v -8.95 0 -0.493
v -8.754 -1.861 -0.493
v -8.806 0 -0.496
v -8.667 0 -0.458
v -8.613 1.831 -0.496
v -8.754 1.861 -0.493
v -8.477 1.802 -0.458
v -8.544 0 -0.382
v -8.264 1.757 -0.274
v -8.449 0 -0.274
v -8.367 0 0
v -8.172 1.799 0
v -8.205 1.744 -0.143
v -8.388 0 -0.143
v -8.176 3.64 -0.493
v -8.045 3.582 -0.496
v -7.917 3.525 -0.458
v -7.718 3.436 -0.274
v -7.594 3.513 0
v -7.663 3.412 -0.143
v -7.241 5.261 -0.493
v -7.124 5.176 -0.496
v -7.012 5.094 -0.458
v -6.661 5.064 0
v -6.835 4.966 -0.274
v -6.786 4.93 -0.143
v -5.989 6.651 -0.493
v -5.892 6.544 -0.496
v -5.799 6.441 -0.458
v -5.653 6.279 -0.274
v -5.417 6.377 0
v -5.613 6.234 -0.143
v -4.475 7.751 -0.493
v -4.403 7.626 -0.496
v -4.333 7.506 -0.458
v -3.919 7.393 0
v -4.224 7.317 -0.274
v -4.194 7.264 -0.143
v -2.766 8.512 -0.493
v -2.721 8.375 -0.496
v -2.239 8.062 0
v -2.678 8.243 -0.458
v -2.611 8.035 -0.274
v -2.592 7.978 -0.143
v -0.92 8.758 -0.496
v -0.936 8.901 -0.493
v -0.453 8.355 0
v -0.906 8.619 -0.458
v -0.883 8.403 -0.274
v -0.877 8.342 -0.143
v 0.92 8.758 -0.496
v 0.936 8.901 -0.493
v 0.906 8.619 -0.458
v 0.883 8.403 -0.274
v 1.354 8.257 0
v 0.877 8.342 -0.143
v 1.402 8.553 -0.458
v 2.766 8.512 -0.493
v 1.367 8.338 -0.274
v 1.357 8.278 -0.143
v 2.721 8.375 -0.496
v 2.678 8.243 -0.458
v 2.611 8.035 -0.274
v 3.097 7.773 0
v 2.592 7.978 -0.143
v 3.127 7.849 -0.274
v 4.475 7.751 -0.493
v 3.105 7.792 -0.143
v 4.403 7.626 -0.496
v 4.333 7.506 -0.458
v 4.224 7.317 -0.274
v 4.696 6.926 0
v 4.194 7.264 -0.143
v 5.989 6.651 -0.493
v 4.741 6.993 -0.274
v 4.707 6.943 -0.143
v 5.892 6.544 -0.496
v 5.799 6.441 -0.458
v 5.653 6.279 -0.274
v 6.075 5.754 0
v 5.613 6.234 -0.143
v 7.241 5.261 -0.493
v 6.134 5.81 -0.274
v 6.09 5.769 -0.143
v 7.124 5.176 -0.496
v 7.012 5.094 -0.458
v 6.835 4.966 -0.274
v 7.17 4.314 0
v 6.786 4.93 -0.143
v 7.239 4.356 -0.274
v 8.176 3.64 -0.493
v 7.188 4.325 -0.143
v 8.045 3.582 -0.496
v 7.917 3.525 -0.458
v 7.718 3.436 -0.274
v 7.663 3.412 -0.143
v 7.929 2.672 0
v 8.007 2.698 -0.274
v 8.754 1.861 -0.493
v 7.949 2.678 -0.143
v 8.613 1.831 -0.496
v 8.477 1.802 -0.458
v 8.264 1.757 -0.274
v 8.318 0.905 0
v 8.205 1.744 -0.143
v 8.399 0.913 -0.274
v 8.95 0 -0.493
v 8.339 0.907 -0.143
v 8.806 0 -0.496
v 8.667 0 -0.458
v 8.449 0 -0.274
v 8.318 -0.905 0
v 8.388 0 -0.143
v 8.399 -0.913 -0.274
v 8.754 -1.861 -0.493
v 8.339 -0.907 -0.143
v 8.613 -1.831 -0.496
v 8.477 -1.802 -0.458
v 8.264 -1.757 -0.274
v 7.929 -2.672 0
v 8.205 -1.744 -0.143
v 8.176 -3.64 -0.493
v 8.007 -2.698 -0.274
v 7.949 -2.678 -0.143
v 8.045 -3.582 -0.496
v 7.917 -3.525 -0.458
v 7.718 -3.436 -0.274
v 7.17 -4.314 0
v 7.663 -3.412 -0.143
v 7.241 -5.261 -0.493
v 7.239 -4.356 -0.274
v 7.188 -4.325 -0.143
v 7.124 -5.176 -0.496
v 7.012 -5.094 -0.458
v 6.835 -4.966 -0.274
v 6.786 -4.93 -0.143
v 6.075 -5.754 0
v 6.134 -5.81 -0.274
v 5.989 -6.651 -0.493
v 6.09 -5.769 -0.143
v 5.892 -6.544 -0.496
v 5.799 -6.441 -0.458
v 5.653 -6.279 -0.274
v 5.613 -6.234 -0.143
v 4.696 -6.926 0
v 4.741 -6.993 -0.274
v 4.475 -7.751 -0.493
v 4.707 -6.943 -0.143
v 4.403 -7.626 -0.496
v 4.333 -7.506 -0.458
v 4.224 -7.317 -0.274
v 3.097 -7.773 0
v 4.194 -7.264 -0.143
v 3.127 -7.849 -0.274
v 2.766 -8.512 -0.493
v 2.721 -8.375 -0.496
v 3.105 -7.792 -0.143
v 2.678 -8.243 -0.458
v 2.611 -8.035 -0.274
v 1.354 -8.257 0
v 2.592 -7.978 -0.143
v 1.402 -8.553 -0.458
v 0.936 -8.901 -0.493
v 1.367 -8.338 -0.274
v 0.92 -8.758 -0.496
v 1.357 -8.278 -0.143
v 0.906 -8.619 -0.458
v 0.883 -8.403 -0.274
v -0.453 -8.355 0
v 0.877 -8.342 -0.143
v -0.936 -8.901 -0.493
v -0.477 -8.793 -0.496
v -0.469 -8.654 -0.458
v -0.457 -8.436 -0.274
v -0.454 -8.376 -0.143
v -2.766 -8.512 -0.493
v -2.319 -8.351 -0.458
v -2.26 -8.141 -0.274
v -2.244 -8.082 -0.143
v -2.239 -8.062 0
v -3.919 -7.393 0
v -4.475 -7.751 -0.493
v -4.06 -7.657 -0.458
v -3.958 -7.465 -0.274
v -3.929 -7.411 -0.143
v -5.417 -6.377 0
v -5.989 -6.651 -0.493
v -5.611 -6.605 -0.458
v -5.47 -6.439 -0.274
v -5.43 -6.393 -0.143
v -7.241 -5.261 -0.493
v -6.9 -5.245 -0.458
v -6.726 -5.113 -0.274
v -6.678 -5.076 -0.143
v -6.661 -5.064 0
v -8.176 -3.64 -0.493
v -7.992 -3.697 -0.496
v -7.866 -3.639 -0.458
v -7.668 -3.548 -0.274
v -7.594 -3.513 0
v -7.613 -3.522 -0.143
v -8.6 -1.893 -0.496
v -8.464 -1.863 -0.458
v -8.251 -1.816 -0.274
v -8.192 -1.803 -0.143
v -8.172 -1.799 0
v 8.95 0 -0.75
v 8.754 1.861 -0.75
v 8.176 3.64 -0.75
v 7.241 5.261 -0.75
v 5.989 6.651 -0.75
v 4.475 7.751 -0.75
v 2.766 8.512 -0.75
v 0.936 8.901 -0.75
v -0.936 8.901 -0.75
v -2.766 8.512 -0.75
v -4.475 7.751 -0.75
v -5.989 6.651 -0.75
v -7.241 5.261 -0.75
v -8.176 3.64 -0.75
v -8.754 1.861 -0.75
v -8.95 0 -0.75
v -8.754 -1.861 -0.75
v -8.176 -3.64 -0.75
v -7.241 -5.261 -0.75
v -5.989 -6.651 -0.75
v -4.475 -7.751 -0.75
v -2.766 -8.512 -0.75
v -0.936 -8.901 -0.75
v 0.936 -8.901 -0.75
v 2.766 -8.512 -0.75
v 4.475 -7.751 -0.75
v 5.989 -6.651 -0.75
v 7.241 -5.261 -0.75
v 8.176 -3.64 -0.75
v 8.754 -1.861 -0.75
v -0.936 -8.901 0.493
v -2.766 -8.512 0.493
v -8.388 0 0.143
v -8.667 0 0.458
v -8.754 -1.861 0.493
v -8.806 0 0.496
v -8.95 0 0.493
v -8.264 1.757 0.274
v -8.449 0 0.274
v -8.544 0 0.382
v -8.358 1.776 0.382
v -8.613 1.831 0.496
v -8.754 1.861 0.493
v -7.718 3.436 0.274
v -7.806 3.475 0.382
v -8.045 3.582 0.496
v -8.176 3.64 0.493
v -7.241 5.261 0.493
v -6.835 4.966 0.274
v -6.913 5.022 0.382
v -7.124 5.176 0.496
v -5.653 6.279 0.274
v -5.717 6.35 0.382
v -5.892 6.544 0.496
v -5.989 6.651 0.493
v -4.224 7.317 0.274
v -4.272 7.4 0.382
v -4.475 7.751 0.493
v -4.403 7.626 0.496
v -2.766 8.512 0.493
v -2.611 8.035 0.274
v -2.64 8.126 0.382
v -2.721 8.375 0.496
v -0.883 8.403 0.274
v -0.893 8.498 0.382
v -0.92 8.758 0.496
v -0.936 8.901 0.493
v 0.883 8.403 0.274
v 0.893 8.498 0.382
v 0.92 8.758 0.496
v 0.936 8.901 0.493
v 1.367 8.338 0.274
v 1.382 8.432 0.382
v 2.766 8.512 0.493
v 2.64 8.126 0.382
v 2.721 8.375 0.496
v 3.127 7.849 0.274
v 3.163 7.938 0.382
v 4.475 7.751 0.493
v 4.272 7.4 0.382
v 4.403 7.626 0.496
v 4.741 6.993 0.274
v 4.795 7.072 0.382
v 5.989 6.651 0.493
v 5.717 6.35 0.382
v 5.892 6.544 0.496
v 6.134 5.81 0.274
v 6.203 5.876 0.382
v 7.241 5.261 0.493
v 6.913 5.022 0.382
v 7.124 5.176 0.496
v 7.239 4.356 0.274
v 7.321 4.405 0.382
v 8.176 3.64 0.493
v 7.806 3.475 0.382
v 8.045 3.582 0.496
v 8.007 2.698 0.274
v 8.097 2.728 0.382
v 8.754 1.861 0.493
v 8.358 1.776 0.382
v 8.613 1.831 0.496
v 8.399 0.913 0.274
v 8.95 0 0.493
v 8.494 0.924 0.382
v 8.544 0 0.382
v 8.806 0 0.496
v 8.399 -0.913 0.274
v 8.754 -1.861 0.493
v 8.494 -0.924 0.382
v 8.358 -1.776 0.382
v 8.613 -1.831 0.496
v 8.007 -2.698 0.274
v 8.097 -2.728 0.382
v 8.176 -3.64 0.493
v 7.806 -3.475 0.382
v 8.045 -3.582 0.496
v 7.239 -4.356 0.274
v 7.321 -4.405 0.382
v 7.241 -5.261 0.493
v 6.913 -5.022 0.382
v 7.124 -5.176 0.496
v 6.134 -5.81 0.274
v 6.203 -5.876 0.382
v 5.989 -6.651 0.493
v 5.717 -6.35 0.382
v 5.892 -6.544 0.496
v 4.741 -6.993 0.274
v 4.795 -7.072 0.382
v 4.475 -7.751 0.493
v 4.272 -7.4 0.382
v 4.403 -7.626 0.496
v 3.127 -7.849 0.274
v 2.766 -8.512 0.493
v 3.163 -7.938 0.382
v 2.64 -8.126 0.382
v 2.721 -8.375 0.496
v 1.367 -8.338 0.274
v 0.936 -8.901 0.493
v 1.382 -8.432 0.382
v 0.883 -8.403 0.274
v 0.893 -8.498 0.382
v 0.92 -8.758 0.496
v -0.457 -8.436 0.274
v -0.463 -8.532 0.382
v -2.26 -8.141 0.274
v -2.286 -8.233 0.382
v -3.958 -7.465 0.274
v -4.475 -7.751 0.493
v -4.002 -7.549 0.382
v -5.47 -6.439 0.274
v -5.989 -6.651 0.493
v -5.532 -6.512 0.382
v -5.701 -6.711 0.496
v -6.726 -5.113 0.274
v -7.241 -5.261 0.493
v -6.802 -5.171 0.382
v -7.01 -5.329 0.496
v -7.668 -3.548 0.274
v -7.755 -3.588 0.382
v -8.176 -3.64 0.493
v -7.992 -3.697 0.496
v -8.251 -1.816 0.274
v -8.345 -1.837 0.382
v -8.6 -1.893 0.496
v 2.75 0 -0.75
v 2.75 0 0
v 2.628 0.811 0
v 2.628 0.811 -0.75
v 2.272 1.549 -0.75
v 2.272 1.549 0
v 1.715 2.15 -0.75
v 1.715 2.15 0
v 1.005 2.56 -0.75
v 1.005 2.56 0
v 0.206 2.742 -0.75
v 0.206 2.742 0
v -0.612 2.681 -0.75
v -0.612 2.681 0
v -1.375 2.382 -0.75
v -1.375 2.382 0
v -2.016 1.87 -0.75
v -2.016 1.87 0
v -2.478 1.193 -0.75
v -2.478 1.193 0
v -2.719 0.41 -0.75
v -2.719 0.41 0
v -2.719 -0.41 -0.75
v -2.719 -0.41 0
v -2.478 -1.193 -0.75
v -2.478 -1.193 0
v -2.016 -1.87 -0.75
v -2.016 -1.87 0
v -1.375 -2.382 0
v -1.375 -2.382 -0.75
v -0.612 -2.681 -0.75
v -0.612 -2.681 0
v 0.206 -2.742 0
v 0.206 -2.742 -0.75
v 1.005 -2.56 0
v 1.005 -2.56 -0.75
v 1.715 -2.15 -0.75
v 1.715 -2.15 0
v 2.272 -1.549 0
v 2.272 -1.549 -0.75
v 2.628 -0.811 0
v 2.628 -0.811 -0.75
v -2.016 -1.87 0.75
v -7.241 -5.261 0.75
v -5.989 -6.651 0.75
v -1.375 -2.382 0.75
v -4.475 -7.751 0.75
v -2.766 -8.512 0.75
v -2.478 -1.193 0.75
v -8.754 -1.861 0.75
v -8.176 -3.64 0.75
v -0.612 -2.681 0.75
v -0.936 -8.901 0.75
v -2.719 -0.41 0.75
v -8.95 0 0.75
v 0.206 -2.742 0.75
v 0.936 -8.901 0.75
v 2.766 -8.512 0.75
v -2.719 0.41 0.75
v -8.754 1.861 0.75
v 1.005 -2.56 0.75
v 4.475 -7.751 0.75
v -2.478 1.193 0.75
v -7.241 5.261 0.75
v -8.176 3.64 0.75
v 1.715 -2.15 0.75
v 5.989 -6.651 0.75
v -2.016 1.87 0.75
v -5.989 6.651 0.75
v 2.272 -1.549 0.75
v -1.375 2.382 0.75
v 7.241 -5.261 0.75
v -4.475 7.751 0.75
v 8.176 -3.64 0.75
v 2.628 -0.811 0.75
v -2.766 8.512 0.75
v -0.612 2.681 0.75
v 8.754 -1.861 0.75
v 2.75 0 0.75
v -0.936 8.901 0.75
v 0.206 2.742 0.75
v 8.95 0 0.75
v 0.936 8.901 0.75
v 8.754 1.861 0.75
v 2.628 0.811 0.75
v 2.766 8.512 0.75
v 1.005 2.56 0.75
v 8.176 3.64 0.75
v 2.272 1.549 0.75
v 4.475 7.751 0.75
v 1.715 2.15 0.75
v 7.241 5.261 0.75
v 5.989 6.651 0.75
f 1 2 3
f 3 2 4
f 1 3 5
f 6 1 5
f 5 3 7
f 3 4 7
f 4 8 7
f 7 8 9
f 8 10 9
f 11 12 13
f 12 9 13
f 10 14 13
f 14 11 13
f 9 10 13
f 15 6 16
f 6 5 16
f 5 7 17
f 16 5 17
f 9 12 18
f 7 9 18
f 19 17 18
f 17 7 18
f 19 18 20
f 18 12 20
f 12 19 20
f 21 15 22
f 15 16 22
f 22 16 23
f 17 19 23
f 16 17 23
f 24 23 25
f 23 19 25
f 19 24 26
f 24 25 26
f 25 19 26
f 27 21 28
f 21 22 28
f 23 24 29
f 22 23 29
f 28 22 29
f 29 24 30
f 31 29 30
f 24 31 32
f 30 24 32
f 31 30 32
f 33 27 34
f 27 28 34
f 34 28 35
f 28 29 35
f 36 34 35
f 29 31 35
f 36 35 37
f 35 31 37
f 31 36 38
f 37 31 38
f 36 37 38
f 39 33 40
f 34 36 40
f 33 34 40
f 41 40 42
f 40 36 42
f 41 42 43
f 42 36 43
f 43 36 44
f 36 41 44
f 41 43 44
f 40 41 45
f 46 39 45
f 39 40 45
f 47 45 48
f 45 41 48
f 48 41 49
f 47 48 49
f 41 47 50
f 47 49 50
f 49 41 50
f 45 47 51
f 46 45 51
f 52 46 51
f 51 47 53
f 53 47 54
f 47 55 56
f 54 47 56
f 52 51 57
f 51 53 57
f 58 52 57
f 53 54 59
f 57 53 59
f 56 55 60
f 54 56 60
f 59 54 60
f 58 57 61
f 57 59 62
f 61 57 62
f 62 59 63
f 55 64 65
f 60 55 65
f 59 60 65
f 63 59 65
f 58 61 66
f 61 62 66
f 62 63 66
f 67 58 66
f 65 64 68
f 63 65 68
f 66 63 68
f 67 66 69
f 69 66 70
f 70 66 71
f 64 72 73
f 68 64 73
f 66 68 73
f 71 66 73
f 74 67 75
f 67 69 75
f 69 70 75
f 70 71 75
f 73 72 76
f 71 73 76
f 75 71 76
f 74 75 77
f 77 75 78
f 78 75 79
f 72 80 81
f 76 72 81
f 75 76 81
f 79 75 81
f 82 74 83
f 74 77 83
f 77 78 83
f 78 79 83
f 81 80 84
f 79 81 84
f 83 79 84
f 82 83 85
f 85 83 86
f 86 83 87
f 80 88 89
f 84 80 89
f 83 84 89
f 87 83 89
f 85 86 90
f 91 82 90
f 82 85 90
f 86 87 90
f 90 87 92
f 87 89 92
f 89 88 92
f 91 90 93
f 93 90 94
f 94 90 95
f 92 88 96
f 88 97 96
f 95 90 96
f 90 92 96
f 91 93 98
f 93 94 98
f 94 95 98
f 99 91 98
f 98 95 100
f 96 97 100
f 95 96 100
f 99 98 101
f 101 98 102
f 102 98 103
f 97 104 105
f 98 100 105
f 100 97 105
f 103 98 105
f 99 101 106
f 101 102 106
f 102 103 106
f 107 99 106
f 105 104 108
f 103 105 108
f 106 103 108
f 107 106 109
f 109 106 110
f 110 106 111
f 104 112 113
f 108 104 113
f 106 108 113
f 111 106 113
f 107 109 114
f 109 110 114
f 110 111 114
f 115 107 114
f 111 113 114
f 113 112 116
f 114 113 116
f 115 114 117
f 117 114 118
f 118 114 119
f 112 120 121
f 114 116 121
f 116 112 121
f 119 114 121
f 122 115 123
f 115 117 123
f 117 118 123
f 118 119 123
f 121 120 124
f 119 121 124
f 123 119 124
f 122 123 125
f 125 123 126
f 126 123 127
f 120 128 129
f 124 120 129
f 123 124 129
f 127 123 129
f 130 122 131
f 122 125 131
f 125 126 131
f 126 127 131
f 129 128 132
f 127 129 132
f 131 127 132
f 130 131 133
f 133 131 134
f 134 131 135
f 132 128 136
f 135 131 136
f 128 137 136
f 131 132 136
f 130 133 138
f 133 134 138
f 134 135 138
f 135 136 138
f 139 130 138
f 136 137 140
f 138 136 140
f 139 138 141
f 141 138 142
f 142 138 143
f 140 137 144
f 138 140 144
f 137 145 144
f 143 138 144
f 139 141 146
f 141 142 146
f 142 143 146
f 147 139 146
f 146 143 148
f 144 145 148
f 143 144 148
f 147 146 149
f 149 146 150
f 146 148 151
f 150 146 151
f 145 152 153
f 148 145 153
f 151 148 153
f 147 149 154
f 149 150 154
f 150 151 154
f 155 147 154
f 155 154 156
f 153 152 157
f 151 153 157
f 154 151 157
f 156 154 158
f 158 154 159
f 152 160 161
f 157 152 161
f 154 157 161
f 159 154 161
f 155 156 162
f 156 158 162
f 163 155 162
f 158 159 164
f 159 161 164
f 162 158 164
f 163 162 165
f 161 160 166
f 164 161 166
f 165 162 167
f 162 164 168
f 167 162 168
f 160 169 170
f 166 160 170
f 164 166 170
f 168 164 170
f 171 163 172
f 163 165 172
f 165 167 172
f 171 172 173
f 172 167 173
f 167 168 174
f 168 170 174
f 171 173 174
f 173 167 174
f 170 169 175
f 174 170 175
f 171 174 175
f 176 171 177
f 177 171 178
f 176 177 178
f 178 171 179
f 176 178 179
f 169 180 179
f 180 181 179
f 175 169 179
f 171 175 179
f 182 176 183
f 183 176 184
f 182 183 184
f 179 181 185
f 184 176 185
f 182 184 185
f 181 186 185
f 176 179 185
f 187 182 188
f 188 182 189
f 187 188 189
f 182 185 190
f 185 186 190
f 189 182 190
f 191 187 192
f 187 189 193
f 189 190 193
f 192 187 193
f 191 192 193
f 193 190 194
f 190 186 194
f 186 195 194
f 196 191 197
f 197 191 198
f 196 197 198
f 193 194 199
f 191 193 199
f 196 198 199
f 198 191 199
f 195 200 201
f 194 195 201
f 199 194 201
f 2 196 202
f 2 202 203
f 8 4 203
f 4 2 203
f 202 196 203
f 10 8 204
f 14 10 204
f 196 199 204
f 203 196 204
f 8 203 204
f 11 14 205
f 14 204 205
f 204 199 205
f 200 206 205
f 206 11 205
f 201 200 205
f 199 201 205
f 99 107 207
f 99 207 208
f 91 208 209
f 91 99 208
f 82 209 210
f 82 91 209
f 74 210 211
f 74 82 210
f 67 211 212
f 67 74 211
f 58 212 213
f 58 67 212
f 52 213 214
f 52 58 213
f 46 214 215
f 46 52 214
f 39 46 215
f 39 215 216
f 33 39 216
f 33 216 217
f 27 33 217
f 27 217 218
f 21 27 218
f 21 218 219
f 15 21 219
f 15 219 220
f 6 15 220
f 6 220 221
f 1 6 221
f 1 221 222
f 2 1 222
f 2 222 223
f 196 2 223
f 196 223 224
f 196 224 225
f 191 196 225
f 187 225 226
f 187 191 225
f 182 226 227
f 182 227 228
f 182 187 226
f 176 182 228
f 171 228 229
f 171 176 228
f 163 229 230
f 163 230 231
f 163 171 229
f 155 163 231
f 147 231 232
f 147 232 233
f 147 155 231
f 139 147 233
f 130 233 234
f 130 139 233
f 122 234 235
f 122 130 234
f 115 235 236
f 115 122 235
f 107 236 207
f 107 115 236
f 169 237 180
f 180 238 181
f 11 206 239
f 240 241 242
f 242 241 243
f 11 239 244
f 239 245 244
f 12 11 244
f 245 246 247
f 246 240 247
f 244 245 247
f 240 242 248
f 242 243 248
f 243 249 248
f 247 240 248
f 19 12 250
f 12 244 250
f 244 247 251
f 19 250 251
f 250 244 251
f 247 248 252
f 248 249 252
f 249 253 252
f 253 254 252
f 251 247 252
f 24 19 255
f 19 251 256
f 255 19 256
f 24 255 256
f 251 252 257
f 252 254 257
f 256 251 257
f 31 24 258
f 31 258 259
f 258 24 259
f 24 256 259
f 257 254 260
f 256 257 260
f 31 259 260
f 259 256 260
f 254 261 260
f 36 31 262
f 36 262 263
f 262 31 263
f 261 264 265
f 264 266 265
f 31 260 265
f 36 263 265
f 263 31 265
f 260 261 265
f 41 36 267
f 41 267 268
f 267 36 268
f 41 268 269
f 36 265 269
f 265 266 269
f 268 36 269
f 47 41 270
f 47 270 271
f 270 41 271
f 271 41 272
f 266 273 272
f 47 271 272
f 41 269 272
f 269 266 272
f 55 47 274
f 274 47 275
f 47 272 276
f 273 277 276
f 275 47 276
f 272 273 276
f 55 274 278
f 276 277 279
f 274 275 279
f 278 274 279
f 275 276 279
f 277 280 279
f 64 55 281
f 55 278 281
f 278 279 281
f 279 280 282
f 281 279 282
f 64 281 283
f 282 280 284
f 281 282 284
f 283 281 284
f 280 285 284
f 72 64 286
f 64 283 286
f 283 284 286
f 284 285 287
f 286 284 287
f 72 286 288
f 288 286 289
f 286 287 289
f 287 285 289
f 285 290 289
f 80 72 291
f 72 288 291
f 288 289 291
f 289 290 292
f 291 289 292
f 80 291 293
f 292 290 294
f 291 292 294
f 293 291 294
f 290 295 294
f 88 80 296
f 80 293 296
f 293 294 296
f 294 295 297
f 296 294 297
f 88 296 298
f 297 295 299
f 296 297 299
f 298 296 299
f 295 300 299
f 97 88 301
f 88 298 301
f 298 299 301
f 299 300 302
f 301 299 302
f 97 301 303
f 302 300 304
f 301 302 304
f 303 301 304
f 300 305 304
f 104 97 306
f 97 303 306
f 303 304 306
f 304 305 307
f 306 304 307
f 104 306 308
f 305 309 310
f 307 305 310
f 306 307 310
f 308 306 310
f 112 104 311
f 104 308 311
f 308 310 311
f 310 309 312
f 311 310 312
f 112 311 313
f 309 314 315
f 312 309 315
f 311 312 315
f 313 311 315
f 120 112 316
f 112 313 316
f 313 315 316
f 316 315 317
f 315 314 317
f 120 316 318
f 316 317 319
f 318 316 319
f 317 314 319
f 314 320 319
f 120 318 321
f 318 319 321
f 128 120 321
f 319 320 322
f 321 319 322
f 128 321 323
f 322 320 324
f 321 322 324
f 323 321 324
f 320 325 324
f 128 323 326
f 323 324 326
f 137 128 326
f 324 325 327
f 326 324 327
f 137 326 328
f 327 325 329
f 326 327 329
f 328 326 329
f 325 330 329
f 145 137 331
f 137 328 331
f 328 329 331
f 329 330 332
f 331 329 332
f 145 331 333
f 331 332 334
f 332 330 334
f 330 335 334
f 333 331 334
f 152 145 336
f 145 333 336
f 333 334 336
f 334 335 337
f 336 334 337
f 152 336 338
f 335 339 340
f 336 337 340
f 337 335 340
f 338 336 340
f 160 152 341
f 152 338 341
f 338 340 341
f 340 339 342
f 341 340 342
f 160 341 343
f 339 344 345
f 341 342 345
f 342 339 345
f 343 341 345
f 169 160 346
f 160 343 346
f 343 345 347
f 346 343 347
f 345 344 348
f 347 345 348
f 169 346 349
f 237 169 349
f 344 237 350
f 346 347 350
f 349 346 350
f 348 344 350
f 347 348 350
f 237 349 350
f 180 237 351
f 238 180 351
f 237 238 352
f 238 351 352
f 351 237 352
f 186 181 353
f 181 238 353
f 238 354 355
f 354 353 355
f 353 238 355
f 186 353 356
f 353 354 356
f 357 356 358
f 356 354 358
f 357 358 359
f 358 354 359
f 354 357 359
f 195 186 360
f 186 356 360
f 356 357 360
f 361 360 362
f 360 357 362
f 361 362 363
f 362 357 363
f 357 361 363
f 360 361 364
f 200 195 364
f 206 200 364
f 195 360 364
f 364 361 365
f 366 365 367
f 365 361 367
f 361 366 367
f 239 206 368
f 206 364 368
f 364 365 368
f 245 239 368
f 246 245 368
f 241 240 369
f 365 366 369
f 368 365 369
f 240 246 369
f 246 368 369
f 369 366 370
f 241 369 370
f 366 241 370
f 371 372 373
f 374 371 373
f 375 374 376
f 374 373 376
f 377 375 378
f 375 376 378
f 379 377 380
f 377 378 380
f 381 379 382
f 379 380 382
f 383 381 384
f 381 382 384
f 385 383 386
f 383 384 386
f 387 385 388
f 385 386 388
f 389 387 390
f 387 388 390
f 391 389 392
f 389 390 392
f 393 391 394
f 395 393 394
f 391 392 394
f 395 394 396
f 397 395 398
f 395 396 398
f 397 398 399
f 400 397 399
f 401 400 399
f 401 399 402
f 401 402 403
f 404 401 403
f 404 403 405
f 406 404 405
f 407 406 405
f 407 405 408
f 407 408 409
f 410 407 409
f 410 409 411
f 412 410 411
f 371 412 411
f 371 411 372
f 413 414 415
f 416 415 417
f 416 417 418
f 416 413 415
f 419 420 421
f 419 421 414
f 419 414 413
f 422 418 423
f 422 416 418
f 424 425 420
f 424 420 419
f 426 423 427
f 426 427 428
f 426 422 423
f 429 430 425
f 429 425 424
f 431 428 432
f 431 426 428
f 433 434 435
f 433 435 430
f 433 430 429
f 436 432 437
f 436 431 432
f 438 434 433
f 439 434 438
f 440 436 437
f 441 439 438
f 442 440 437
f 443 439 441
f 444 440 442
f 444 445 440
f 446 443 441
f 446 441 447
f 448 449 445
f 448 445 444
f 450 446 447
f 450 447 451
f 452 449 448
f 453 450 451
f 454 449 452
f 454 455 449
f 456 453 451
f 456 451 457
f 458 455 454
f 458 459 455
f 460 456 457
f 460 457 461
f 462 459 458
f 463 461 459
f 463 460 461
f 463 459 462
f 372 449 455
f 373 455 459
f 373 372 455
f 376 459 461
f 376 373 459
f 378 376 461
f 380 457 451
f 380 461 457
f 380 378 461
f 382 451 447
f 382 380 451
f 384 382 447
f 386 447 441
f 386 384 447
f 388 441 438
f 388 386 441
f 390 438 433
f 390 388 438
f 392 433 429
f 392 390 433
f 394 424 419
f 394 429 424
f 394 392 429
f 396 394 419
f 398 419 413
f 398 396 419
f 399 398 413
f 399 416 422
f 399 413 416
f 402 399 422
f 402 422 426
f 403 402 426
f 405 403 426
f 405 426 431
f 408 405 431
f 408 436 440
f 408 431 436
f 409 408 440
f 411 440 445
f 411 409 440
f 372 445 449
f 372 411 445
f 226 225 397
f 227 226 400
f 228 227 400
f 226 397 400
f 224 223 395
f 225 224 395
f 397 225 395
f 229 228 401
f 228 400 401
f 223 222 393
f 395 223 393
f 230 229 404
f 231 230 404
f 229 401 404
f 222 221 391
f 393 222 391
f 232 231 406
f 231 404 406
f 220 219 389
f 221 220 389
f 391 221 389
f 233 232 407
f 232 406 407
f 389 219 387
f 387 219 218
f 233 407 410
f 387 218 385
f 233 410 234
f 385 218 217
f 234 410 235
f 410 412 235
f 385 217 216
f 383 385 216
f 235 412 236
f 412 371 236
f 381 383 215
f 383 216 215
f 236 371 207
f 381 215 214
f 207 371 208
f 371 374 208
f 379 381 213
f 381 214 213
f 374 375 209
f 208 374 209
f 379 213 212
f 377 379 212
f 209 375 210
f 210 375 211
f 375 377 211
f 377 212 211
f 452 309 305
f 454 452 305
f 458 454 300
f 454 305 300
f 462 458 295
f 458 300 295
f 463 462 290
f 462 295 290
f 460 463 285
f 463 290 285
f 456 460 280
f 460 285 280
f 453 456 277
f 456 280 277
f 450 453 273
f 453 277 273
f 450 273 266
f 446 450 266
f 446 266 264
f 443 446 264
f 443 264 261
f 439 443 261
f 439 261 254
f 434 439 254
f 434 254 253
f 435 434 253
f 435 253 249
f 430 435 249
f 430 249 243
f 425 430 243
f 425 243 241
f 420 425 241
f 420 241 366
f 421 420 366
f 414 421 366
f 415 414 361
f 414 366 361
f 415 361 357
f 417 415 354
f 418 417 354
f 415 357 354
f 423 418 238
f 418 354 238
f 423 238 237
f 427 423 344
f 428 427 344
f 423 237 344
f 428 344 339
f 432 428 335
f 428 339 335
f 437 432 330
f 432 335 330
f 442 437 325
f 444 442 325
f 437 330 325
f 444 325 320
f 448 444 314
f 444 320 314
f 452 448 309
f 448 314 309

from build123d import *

# Parameters (mm, degrees)
F0_R          = 8.95
F1_DEPTH      = 0.75
F1_DEPTH_BACK = 0.75
F2_R          = 0.5
F4_R          = 2.75
F5_DEPTH      = 30.7
F5_DEPTH_BACK = 27


with BuildPart() as f1:
    # F0 (on Top) → F1 (new body, two sides)
    with BuildSketch(Plane.XY) as f1_sk:
        Circle(F0_R)
    extrude(amount=-F1_DEPTH)
    extrude(f1_sk.sketch, amount=F1_DEPTH_BACK)

    # F2 (on Front) → F3 (revolve, cut)
    with BuildSketch(Plane.XZ):
        with Locations((-8.8674183935, 0)):
            Circle(F2_R)
    revolve(axis=Axis((0, 0, -0.3013146343), (0, 0, -1)), mode=Mode.SUBTRACT)

    # F4 (on Top) → F5 (cut, two sides)
    with BuildSketch(Plane.XY) as f5_sk:
        Circle(F4_R)
    extrude(amount=-F5_DEPTH, mode=Mode.SUBTRACT)
    extrude(f5_sk.sketch, amount=F5_DEPTH_BACK, mode=Mode.SUBTRACT)


solid = f1.part
